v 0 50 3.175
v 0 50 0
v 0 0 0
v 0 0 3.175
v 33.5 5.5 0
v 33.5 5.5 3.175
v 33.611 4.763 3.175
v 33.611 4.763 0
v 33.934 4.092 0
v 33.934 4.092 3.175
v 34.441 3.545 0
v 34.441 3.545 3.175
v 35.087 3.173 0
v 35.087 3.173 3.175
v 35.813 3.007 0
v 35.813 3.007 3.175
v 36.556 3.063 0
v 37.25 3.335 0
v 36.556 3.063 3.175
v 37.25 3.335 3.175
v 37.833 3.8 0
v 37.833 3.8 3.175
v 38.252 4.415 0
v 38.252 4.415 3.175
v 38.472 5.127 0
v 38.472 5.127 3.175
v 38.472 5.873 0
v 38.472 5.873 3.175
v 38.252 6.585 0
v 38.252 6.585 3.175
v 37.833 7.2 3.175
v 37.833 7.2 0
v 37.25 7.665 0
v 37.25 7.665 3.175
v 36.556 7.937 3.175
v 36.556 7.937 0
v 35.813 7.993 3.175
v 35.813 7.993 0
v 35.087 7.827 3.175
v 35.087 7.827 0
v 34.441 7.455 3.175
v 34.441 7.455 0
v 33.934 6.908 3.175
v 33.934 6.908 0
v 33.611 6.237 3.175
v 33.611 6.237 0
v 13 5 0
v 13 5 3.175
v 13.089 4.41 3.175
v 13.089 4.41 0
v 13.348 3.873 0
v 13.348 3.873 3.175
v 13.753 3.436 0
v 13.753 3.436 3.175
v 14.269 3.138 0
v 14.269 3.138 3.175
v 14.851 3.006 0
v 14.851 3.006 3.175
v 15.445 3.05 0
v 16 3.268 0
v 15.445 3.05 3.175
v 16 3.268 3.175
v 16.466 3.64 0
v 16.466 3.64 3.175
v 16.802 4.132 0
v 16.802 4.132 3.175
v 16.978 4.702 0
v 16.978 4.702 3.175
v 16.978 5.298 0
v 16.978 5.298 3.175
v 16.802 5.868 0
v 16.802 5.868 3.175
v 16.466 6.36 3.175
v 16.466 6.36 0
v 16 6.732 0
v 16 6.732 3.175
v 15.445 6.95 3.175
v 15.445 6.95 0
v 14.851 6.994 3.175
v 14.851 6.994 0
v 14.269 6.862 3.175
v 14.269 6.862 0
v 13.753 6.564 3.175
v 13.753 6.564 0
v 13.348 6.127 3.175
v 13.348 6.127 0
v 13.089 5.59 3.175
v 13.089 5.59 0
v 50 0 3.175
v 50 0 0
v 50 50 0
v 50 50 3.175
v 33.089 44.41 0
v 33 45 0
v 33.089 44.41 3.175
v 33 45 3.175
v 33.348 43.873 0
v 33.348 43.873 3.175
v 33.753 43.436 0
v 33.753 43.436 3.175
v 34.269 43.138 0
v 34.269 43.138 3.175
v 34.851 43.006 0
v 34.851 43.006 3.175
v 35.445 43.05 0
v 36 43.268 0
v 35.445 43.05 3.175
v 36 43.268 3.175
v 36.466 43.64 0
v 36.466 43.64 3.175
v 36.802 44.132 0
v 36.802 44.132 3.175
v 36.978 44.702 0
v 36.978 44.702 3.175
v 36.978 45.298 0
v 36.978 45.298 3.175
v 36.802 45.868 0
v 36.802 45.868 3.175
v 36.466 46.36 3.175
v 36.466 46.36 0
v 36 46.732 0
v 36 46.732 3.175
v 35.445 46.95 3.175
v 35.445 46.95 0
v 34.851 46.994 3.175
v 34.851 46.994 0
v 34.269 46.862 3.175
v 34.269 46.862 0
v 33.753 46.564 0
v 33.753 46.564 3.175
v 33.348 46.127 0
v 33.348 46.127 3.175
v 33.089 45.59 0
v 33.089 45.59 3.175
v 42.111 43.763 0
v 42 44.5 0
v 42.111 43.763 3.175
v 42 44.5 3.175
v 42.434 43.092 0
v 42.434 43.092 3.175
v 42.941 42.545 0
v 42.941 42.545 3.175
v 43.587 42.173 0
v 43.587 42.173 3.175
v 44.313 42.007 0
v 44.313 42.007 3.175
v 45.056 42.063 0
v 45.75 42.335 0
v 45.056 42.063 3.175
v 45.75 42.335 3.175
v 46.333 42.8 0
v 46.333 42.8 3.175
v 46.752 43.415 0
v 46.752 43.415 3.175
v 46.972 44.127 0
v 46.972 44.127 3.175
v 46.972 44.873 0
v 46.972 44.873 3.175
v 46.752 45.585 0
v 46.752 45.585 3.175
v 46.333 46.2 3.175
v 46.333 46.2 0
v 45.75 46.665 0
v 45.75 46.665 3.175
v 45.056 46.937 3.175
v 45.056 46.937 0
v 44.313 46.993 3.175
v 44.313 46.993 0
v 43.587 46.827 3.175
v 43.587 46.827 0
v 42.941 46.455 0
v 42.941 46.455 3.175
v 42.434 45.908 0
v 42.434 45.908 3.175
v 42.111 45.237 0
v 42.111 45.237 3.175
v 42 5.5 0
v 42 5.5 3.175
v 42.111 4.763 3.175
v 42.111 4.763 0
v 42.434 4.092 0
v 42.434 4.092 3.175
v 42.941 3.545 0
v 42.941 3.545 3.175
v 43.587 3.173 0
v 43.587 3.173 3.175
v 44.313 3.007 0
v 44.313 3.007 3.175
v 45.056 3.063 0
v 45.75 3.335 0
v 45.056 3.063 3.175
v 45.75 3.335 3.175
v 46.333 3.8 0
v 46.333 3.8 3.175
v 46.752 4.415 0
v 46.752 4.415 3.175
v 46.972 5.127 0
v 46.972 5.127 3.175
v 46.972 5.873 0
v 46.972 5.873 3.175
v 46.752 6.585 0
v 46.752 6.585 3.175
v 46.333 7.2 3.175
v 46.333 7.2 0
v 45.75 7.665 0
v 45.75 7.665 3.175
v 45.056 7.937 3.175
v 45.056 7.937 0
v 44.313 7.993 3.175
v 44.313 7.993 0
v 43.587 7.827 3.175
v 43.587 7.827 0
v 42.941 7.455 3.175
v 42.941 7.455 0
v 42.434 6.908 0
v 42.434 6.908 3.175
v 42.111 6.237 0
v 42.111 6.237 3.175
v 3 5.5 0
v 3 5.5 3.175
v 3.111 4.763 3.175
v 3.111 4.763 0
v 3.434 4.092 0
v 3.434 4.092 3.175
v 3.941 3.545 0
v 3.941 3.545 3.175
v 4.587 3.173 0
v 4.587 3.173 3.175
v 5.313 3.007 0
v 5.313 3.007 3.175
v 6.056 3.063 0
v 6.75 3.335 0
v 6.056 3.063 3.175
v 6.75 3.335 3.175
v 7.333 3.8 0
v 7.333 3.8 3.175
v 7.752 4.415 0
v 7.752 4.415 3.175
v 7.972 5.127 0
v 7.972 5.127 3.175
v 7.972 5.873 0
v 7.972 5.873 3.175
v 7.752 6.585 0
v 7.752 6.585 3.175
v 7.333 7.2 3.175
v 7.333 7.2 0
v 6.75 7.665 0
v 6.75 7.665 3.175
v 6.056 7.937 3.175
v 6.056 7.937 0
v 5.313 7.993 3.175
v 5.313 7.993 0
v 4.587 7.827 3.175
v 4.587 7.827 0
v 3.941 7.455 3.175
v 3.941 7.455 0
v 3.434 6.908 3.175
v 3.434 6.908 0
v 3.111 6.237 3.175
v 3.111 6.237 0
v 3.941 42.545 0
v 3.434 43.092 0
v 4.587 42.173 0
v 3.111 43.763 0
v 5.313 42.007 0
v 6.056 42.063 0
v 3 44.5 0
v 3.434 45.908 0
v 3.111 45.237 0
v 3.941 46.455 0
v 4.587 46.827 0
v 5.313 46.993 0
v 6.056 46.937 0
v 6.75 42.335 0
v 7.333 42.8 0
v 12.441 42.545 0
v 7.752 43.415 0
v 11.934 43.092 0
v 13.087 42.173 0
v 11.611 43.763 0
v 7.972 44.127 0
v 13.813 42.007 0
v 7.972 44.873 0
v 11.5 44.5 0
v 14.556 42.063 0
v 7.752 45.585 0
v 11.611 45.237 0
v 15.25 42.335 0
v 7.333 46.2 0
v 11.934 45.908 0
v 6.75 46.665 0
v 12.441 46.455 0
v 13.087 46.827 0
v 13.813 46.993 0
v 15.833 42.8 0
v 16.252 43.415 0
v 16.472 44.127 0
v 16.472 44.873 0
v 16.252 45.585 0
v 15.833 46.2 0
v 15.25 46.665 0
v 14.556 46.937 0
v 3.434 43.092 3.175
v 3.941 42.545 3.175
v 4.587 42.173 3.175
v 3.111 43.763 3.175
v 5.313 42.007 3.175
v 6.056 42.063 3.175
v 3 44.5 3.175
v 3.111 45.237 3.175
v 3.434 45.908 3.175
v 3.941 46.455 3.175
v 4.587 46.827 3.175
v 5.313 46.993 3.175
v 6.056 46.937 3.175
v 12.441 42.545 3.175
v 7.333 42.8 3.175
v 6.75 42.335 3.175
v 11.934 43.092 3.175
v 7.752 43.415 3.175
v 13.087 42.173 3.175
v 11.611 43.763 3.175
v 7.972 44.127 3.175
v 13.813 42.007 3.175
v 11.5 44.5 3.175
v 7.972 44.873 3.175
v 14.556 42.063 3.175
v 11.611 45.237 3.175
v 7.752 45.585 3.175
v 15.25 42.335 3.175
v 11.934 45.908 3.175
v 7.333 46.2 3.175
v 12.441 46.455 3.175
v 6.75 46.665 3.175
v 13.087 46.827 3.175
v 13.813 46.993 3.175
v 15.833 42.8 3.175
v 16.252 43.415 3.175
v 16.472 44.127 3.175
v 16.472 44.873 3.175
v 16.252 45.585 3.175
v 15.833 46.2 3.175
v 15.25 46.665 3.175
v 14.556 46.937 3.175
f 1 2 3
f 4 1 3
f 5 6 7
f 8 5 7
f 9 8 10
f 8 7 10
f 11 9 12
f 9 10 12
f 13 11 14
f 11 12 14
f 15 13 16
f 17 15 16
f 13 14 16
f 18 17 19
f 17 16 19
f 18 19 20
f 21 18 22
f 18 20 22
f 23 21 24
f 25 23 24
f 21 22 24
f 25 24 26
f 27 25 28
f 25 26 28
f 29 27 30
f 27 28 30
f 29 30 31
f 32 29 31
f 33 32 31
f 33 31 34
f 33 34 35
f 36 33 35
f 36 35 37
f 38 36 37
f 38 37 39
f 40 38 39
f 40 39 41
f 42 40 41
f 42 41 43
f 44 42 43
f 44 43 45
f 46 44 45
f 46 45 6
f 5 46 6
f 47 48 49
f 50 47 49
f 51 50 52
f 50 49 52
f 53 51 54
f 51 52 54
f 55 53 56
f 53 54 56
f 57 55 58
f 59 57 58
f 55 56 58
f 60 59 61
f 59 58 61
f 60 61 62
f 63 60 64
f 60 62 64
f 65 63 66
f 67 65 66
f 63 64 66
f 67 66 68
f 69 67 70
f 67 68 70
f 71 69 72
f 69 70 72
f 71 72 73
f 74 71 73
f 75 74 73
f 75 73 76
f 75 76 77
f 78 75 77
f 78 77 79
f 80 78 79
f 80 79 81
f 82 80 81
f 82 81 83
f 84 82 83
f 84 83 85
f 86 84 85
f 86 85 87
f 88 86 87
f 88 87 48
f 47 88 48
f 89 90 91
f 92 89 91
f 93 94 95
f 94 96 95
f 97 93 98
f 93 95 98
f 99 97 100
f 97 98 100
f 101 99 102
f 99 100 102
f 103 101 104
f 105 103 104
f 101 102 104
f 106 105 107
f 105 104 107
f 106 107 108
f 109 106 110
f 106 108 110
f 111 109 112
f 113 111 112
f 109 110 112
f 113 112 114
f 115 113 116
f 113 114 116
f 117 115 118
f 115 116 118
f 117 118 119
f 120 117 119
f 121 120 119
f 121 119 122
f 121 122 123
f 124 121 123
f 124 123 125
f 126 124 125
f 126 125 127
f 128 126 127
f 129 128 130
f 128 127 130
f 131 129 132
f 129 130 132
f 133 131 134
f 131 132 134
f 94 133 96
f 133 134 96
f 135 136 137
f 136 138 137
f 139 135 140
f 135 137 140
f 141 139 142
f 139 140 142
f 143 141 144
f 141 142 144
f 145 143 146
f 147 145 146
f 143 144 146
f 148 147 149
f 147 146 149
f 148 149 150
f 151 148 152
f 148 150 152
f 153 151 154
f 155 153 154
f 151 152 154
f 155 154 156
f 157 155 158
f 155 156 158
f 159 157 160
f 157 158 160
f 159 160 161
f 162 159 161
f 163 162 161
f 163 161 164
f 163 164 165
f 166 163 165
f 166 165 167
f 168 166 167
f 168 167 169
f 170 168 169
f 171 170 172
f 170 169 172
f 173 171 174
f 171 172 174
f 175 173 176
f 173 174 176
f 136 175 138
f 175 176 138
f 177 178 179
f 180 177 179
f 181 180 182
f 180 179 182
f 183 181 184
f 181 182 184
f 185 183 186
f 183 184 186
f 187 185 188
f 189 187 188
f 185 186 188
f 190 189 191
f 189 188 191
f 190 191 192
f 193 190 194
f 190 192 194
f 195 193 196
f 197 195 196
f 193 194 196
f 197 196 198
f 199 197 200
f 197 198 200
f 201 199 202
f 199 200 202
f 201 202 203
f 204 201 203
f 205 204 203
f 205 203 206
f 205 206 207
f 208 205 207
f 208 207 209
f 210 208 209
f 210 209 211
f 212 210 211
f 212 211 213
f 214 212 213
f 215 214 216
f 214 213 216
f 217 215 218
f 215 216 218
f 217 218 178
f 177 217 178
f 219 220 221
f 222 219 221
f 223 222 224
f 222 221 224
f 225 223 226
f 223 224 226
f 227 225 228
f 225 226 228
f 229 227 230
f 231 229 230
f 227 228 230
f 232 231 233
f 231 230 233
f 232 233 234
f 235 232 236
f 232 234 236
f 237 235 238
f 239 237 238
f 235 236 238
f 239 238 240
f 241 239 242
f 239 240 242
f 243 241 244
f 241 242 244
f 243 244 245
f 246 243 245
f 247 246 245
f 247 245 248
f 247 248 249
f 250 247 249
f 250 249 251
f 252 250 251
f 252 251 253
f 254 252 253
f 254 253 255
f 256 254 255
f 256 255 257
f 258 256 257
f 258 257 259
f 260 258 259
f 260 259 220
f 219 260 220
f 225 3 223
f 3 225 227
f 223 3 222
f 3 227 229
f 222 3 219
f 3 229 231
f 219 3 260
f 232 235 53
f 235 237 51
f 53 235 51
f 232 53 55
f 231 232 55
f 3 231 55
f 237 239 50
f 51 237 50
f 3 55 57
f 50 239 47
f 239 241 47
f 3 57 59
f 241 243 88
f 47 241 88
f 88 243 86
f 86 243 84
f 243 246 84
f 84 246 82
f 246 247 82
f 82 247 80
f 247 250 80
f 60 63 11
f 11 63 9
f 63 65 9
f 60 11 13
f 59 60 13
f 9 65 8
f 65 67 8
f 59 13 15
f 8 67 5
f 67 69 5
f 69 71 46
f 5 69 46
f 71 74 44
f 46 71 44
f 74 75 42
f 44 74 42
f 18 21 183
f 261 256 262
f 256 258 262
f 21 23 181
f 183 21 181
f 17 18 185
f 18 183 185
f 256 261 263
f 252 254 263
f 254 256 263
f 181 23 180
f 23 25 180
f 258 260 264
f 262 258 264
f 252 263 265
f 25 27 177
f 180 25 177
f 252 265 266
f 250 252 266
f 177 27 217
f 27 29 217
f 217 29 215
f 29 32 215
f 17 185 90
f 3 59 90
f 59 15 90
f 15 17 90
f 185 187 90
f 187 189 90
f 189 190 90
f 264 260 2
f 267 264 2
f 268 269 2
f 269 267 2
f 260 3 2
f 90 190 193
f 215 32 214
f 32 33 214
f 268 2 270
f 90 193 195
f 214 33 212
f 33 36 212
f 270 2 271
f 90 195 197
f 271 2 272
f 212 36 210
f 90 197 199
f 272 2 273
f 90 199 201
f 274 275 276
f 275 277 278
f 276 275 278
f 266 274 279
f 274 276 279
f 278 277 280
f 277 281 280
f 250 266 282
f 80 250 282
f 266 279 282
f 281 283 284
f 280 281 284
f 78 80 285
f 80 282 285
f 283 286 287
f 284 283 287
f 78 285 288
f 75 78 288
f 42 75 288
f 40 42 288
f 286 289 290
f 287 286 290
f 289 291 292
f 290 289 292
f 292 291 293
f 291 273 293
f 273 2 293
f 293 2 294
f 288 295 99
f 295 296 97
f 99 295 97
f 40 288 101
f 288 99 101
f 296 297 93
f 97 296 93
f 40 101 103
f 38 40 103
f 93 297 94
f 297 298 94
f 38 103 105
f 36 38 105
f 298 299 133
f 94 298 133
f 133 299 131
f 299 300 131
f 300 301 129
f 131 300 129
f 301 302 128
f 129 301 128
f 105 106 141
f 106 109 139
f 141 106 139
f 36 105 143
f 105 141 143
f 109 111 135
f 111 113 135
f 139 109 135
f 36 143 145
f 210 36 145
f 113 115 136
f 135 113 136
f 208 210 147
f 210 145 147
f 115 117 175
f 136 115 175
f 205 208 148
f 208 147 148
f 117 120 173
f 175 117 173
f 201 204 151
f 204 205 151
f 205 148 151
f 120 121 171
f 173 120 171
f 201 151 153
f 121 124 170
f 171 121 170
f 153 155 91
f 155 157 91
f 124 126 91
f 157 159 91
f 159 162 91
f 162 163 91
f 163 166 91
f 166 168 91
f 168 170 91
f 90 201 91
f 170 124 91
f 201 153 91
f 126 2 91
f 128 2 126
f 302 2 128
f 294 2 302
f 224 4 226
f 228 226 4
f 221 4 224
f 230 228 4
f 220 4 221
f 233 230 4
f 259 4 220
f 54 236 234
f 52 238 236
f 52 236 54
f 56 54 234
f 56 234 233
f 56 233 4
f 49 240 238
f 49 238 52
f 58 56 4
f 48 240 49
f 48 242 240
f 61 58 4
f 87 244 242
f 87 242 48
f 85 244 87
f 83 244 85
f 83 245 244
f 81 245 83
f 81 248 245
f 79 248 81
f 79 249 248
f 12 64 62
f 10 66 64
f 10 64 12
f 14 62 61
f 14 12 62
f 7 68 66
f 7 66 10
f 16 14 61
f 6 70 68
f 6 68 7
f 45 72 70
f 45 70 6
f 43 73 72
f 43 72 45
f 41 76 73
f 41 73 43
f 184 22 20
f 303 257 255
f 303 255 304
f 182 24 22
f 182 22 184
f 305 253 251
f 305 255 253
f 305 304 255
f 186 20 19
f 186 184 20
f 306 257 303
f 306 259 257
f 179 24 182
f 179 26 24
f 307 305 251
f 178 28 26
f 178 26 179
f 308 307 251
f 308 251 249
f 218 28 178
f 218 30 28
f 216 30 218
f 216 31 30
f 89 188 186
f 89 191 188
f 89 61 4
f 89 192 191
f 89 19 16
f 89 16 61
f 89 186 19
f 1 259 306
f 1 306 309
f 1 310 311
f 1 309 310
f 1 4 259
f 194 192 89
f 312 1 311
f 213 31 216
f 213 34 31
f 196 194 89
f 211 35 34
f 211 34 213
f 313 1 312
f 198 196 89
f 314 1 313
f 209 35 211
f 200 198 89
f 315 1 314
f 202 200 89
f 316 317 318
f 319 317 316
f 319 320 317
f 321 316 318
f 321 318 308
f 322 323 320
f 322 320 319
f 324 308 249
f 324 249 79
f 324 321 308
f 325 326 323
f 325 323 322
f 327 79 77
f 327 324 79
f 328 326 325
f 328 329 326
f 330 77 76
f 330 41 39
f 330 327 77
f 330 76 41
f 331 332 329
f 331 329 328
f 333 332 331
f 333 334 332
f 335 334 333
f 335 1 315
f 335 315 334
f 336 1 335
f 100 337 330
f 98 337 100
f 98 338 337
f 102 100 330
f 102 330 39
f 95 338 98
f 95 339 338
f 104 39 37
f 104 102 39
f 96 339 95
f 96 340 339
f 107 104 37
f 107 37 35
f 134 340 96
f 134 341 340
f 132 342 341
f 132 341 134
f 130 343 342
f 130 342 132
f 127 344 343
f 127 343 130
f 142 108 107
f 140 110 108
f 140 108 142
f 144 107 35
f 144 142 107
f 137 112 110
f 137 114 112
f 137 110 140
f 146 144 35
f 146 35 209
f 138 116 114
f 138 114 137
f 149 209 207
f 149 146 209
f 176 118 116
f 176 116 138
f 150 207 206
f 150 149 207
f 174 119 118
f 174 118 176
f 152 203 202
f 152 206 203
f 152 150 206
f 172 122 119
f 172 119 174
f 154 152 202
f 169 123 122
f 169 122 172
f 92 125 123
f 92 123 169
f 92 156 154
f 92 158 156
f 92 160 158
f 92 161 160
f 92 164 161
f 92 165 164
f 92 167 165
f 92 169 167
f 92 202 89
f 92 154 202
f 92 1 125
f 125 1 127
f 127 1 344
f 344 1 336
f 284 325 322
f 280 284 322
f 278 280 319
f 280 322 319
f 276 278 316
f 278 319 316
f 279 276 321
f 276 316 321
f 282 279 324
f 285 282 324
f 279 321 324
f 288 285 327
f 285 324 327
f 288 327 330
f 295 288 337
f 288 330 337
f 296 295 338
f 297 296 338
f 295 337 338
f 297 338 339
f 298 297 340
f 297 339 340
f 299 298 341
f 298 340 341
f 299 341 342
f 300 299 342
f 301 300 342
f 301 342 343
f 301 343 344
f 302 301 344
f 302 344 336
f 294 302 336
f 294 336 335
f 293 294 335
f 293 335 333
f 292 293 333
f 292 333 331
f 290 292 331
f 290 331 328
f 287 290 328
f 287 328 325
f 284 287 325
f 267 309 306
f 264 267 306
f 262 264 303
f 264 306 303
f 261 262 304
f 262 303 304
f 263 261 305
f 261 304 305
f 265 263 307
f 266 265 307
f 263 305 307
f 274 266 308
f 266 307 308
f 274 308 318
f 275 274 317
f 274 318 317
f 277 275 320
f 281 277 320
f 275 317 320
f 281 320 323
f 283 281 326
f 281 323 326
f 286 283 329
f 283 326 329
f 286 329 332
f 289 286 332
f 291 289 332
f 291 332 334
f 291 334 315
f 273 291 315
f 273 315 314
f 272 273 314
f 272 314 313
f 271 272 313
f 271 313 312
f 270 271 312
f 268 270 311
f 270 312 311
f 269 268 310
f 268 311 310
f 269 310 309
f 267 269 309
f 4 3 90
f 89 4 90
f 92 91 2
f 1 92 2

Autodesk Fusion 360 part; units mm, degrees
sketch "Esquisse1" plane through (0, 0, 0) normal (0, 0, 1) x (1, 0, 0)
  line L0 (0, 0) -> (50, 0)
  line L1 (50, 0) -> (50, 50)
  line L2 (50, 50) -> (0, 50)
  line L3 (0, 50) -> (0, 0)
  dimension "d1" = 50
  dimension "d2" = 50
extrude "Extrusion1" add sketch "Esquisse1" along normal blind 3.175
sketch "Esquisse2" plane through (0, 0, 3.175) normal (0, 0, 1) x (-1, 0, 0)
  line L0 (0, -50) -> (0, 0)
  line L1 (0, 0) -> (-50, 0)
  line L2 (-50, 0) -> (-50, -50)
  line L3 (-50, -50) -> (0, -50)
  line L4 (-50, -50) -> (0, 0) construction
  circle A0 centre (-5.5, -44.5) radius 2.5
  circle A1 centre (-44.5, -44.5) radius 2.5
  circle A2 centre (-44.5, -5.5) radius 2.5
  circle A3 centre (-5.5, -5.5) radius 2.5
  line L5 (-44.5, -5.5) -> (-5.5, -44.5) construction
  line L6 (-5.5, -5.5) -> (-44.5, -44.5) construction
  point P0 (-47, -5.5)
  point P1 (-44.5, -3)
  dimension "d5" = 3
  dimension "d6" = 3
  dimension "d7" = 5
extrude "Extrusion2" cut sketch "Esquisse2" against normal up to surface (3.175 mm away) contours A0 | A1 | A2 | A3
sketch "Esquisse3" plane through (0, 0, 3.175) normal (0, 0, 1) x (-1, 0, 0)
  circle A0 centre (-5.5, -5.5) radius 2.5
  circle A1 centre (-44.5, -5.5) radius 2.5
  circle A2 centre (-5.5, -44.5) radius 2.5
  circle A3 centre (-44.5, -44.5) radius 2.5
  line L0 (0, -50) -> (0, 0)
  line L1 (0, 0) -> (-50, 0)
  line L2 (-50, 0) -> (-50, -50)
  line L3 (-50, -50) -> (0, -50)
  line L4 (-50, -50) -> (0, 0) construction
  circle A4 centre (-35, -45) radius 2
  circle A5 centre (-15, -5) radius 2
  line L5 (-15, -5) -> (-35, -45) construction
  point P0 (-25, -25)
  point P1 (-35, -47)
  dimension "d10" = 4
  dimension "d11" = 10
  dimension "d12" = 3
extrude "Extrusion3" cut sketch "Esquisse3" against normal up to surface (3.175 mm away) contours A4 | A5
sketch "Esquisse4" plane through (0, 0, 3.175) normal (0, 0, 1) x (-1, 0, 0)
  circle A0 centre (-35, -45) radius 2
  circle A1 centre (-15, -5) radius 2
  circle A2 centre (-5.5, -5.5) radius 2.5
  circle A3 centre (-44.5, -5.5) radius 2.5
  circle A4 centre (-5.5, -44.5) radius 2.5
  circle A5 centre (-44.5, -44.5) radius 2.5
  line L0 (0, -50) -> (0, 0)
  line L1 (0, 0) -> (-50, 0)
  line L2 (-50, 0) -> (-50, -50)
  line L3 (-50, -50) -> (0, -50)
  line L4 (-10, -40) -> (-40, -40) construction
  line L5 (-40, -40) -> (-40, -10) construction
  line L6 (-40, -10) -> (-10, -10) construction
  line L7 (-10, -10) -> (-10, -40) construction
  line L8 (-10, -40) -> (-40, -10) construction
  line L9 (0, 0) -> (-50, -50) construction
  circle A6 centre (-14, -44.5) radius 2.5
  circle A7 centre (-36, -5.5) radius 2.5
  line L10 (-36, -5.5) -> (-14, -44.5) construction
  point P0 (-14, -42)
  dimension "d15" = 30
  dimension "d16" = 30
  dimension "d17" = 5
  dimension "d18" = 2
  dimension "d19" = 4
extrude "Extrusion4" cut sketch "Esquisse4" against normal up to surface (3.175 mm away) contours A6 | A7
sketch "Esquisse5" plane through (0, 0, 3.175) normal (0, 0, 1) x (-1, 0, 0)
  circle A0 centre (-14, -44.5) radius 2.5
  circle A1 centre (-36, -5.5) radius 2.5
  circle A2 centre (-35, -45) radius 2
  circle A3 centre (-15, -5) radius 2
  circle A4 centre (-5.5, -5.5) radius 2.5
  circle A5 centre (-44.5, -5.5) radius 2.5
  circle A6 centre (-5.5, -44.5) radius 2.5
  circle A7 centre (-44.5, -44.5) radius 2.5
  line L0 (0, -50) -> (0, 0)
  line L1 (0, 0) -> (-50, 0)
  line L2 (-50, 0) -> (-50, -50)
  line L3 (-50, -50) -> (0, -50)
  line L4 (-10, -40) -> (-40, -40)
  line L5 (-40, -40) -> (-40, -10)
  line L6 (-40, -10) -> (-10, -10)
  line L7 (-10, -10) -> (-10, -40)
  point P0 (-40, -25)
  point P1 (-50, -25)
  point P2 (-25, -40)
  point P3 (-25, -50)
  dimension "d22" = 30
sketch "Esquisse6" plane through (0, 0, 0) normal (0, 0, -1) x (1, 0, 0)
  circle A0 centre (14, -44.5) radius 2.5
  circle A1 centre (36, -5.5) radius 2.5
  circle A2 centre (35, -45) radius 2
  circle A3 centre (15, -5) radius 2
  circle A4 centre (5.5, -5.5) radius 2.5
  circle A5 centre (44.5, -5.5) radius 2.5
  circle A6 centre (5.5, -44.5) radius 2.5
  circle A7 centre (44.5, -44.5) radius 2.5
  line L0 (0, 0) -> (0, -50)
  line L1 (0, -50) -> (50, -50)
  line L2 (50, -50) -> (50, 0)
  line L3 (50, 0) -> (0, 0)
  line L4 (0, -10) -> (50, -10)
  line L5 (50, -10) -> (50, -40)
  line L6 (50, -40) -> (0, -40)
  line L7 (0, -40) -> (0, -10)
  point P0 (10, -40)
  point P1 (10, -10)
equation "d3 = 1 / 8 * 1 in"
